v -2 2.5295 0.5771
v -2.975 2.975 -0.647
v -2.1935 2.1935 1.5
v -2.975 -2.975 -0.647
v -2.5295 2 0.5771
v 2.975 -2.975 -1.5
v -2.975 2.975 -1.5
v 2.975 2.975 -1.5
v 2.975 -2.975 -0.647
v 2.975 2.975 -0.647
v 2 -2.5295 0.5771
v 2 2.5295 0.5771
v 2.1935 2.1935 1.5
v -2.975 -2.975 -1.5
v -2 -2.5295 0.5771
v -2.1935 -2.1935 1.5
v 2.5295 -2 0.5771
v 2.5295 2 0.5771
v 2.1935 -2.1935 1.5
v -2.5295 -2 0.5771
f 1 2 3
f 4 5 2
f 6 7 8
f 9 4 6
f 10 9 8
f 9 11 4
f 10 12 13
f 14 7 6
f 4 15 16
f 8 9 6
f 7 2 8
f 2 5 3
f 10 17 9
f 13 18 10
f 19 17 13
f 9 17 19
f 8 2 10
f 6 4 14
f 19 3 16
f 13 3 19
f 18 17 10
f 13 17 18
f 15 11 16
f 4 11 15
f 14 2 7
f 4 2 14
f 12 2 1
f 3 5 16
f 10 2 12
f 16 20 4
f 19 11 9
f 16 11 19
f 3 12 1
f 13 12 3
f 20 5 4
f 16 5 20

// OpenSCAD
use <lib.scad>

hd = 72;
ld = 8;

bounds = [5.95, 5.95, 3];

module oring() {
	difference() {
		cyl(0.51, 0.51, 0.03);
		cyl(0.48, 0.48, 0.97);
	}
}

module piston() {
	difference() {
		cyl(0.5, 0.5, 1.0);
		translate([0,0,0.1]) oring();
		translate([0,0,0.2]) oring();
		translate([0,0,0.3]) oring();
		translate([0,0,0.4]) oring();
	}
}

module frameHD($fn=hd) {
	difference() {
		fillet(0.01,$fn=8) difference() {
			box(bounds);
			rotate([0,0,000]) translate([bounds.x/1.57,0,bounds.z/2]) rotate([0,70,0]) box(bounds);
			rotate([0,0,090]) translate([bounds.x/1.57,0,bounds.z/2]) rotate([0,70,0]) box(bounds);
			rotate([0,0,180]) translate([bounds.x/1.57,0,bounds.z/2]) rotate([0,70,0]) box(bounds);
			rotate([0,0,270]) translate([bounds.x/1.57,0,bounds.z/2]) rotate([0,70,0]) box(bounds);
		}
		for (i = [0:3])
			rotate([0,0,90*i]) translate([2.5,0,0.5]) rotate([0,70,0]) cyl(0.6, 0.6, 0.5);

		for (i = [0:3]) for (j = [0:3])
			rotate([0,0,90*i]) translate([3.0-j/8,1.5,j/4+0.05]) rotate([0,20,0]) box([1,1,0.1]);

		for (i = [0:3]) for (j = [0:3])
			rotate([0,0,90*i]) translate([3.0-j/8,-1.5,j/4+0.05]) rotate([0,20,0]) box([1,1,0.1]);

		translate([0,0,1.5]) box([4,4,1]);

		translate([1,0,1]) rotate([90,0,0]) cyl(0.75, 0.75, 3.0);
		translate([-1,0,1]) cyl(0.55, 0.55, 1.0);
		translate([-1,1.2,1]) cyl(0.55, 0.55, 1.0);
		translate([-1,-1.2,1]) cyl(0.55, 0.55, 1.0);
	}
}

module frameLD($fn=ld) {
	difference() {
		difference() {
			box(bounds);
			rotate([0,0,000]) translate([bounds.x/1.57,0,bounds.z/2]) rotate([0,70,0]) box(bounds);
			rotate([0,0,090]) translate([bounds.x/1.57,0,bounds.z/2]) rotate([0,70,0]) box(bounds);
			rotate([0,0,180]) translate([bounds.x/1.57,0,bounds.z/2]) rotate([0,70,0]) box(bounds);
			rotate([0,0,270]) translate([bounds.x/1.57,0,bounds.z/2]) rotate([0,70,0]) box(bounds);
		}
		for (i = [0:3])
			rotate([0,0,90*i]) translate([2.5,0,0.5]) rotate([0,70,0]) cyl(0.6, 0.6, 0.5);

		for (i = [0:3]) for (j = [0:3])
			rotate([0,0,90*i]) translate([3.0-j/8,1.5,j/4+0.05]) rotate([0,20,0]) box([1,1,0.1]);

		for (i = [0:3]) for (j = [0:3])
			rotate([0,0,90*i]) translate([3.0-j/8,-1.5,j/4+0.05]) rotate([0,20,0]) box([1,1,0.1]);

		translate([0,0,1.5]) box([4,4,1]);

		translate([1,0,1]) rotate([90,0,0]) cyl(0.75, 0.75, 3.0);
		translate([-1,0,1]) cyl(0.55, 0.55, 1.0);
		translate([-1,1.2,1]) cyl(0.55, 0.55, 1.0);
		translate([-1,-1.2,1]) cyl(0.55, 0.55, 1.0);
	}
}

module frameVLD($fn=ld) {
	hull() frameLD();
}

//frameHD();
//frameLD();
frameVLD();

//translate([-1,0,1]) piston($fn=hd);
//translate([-1,0,1]) piston($fn=ld);
